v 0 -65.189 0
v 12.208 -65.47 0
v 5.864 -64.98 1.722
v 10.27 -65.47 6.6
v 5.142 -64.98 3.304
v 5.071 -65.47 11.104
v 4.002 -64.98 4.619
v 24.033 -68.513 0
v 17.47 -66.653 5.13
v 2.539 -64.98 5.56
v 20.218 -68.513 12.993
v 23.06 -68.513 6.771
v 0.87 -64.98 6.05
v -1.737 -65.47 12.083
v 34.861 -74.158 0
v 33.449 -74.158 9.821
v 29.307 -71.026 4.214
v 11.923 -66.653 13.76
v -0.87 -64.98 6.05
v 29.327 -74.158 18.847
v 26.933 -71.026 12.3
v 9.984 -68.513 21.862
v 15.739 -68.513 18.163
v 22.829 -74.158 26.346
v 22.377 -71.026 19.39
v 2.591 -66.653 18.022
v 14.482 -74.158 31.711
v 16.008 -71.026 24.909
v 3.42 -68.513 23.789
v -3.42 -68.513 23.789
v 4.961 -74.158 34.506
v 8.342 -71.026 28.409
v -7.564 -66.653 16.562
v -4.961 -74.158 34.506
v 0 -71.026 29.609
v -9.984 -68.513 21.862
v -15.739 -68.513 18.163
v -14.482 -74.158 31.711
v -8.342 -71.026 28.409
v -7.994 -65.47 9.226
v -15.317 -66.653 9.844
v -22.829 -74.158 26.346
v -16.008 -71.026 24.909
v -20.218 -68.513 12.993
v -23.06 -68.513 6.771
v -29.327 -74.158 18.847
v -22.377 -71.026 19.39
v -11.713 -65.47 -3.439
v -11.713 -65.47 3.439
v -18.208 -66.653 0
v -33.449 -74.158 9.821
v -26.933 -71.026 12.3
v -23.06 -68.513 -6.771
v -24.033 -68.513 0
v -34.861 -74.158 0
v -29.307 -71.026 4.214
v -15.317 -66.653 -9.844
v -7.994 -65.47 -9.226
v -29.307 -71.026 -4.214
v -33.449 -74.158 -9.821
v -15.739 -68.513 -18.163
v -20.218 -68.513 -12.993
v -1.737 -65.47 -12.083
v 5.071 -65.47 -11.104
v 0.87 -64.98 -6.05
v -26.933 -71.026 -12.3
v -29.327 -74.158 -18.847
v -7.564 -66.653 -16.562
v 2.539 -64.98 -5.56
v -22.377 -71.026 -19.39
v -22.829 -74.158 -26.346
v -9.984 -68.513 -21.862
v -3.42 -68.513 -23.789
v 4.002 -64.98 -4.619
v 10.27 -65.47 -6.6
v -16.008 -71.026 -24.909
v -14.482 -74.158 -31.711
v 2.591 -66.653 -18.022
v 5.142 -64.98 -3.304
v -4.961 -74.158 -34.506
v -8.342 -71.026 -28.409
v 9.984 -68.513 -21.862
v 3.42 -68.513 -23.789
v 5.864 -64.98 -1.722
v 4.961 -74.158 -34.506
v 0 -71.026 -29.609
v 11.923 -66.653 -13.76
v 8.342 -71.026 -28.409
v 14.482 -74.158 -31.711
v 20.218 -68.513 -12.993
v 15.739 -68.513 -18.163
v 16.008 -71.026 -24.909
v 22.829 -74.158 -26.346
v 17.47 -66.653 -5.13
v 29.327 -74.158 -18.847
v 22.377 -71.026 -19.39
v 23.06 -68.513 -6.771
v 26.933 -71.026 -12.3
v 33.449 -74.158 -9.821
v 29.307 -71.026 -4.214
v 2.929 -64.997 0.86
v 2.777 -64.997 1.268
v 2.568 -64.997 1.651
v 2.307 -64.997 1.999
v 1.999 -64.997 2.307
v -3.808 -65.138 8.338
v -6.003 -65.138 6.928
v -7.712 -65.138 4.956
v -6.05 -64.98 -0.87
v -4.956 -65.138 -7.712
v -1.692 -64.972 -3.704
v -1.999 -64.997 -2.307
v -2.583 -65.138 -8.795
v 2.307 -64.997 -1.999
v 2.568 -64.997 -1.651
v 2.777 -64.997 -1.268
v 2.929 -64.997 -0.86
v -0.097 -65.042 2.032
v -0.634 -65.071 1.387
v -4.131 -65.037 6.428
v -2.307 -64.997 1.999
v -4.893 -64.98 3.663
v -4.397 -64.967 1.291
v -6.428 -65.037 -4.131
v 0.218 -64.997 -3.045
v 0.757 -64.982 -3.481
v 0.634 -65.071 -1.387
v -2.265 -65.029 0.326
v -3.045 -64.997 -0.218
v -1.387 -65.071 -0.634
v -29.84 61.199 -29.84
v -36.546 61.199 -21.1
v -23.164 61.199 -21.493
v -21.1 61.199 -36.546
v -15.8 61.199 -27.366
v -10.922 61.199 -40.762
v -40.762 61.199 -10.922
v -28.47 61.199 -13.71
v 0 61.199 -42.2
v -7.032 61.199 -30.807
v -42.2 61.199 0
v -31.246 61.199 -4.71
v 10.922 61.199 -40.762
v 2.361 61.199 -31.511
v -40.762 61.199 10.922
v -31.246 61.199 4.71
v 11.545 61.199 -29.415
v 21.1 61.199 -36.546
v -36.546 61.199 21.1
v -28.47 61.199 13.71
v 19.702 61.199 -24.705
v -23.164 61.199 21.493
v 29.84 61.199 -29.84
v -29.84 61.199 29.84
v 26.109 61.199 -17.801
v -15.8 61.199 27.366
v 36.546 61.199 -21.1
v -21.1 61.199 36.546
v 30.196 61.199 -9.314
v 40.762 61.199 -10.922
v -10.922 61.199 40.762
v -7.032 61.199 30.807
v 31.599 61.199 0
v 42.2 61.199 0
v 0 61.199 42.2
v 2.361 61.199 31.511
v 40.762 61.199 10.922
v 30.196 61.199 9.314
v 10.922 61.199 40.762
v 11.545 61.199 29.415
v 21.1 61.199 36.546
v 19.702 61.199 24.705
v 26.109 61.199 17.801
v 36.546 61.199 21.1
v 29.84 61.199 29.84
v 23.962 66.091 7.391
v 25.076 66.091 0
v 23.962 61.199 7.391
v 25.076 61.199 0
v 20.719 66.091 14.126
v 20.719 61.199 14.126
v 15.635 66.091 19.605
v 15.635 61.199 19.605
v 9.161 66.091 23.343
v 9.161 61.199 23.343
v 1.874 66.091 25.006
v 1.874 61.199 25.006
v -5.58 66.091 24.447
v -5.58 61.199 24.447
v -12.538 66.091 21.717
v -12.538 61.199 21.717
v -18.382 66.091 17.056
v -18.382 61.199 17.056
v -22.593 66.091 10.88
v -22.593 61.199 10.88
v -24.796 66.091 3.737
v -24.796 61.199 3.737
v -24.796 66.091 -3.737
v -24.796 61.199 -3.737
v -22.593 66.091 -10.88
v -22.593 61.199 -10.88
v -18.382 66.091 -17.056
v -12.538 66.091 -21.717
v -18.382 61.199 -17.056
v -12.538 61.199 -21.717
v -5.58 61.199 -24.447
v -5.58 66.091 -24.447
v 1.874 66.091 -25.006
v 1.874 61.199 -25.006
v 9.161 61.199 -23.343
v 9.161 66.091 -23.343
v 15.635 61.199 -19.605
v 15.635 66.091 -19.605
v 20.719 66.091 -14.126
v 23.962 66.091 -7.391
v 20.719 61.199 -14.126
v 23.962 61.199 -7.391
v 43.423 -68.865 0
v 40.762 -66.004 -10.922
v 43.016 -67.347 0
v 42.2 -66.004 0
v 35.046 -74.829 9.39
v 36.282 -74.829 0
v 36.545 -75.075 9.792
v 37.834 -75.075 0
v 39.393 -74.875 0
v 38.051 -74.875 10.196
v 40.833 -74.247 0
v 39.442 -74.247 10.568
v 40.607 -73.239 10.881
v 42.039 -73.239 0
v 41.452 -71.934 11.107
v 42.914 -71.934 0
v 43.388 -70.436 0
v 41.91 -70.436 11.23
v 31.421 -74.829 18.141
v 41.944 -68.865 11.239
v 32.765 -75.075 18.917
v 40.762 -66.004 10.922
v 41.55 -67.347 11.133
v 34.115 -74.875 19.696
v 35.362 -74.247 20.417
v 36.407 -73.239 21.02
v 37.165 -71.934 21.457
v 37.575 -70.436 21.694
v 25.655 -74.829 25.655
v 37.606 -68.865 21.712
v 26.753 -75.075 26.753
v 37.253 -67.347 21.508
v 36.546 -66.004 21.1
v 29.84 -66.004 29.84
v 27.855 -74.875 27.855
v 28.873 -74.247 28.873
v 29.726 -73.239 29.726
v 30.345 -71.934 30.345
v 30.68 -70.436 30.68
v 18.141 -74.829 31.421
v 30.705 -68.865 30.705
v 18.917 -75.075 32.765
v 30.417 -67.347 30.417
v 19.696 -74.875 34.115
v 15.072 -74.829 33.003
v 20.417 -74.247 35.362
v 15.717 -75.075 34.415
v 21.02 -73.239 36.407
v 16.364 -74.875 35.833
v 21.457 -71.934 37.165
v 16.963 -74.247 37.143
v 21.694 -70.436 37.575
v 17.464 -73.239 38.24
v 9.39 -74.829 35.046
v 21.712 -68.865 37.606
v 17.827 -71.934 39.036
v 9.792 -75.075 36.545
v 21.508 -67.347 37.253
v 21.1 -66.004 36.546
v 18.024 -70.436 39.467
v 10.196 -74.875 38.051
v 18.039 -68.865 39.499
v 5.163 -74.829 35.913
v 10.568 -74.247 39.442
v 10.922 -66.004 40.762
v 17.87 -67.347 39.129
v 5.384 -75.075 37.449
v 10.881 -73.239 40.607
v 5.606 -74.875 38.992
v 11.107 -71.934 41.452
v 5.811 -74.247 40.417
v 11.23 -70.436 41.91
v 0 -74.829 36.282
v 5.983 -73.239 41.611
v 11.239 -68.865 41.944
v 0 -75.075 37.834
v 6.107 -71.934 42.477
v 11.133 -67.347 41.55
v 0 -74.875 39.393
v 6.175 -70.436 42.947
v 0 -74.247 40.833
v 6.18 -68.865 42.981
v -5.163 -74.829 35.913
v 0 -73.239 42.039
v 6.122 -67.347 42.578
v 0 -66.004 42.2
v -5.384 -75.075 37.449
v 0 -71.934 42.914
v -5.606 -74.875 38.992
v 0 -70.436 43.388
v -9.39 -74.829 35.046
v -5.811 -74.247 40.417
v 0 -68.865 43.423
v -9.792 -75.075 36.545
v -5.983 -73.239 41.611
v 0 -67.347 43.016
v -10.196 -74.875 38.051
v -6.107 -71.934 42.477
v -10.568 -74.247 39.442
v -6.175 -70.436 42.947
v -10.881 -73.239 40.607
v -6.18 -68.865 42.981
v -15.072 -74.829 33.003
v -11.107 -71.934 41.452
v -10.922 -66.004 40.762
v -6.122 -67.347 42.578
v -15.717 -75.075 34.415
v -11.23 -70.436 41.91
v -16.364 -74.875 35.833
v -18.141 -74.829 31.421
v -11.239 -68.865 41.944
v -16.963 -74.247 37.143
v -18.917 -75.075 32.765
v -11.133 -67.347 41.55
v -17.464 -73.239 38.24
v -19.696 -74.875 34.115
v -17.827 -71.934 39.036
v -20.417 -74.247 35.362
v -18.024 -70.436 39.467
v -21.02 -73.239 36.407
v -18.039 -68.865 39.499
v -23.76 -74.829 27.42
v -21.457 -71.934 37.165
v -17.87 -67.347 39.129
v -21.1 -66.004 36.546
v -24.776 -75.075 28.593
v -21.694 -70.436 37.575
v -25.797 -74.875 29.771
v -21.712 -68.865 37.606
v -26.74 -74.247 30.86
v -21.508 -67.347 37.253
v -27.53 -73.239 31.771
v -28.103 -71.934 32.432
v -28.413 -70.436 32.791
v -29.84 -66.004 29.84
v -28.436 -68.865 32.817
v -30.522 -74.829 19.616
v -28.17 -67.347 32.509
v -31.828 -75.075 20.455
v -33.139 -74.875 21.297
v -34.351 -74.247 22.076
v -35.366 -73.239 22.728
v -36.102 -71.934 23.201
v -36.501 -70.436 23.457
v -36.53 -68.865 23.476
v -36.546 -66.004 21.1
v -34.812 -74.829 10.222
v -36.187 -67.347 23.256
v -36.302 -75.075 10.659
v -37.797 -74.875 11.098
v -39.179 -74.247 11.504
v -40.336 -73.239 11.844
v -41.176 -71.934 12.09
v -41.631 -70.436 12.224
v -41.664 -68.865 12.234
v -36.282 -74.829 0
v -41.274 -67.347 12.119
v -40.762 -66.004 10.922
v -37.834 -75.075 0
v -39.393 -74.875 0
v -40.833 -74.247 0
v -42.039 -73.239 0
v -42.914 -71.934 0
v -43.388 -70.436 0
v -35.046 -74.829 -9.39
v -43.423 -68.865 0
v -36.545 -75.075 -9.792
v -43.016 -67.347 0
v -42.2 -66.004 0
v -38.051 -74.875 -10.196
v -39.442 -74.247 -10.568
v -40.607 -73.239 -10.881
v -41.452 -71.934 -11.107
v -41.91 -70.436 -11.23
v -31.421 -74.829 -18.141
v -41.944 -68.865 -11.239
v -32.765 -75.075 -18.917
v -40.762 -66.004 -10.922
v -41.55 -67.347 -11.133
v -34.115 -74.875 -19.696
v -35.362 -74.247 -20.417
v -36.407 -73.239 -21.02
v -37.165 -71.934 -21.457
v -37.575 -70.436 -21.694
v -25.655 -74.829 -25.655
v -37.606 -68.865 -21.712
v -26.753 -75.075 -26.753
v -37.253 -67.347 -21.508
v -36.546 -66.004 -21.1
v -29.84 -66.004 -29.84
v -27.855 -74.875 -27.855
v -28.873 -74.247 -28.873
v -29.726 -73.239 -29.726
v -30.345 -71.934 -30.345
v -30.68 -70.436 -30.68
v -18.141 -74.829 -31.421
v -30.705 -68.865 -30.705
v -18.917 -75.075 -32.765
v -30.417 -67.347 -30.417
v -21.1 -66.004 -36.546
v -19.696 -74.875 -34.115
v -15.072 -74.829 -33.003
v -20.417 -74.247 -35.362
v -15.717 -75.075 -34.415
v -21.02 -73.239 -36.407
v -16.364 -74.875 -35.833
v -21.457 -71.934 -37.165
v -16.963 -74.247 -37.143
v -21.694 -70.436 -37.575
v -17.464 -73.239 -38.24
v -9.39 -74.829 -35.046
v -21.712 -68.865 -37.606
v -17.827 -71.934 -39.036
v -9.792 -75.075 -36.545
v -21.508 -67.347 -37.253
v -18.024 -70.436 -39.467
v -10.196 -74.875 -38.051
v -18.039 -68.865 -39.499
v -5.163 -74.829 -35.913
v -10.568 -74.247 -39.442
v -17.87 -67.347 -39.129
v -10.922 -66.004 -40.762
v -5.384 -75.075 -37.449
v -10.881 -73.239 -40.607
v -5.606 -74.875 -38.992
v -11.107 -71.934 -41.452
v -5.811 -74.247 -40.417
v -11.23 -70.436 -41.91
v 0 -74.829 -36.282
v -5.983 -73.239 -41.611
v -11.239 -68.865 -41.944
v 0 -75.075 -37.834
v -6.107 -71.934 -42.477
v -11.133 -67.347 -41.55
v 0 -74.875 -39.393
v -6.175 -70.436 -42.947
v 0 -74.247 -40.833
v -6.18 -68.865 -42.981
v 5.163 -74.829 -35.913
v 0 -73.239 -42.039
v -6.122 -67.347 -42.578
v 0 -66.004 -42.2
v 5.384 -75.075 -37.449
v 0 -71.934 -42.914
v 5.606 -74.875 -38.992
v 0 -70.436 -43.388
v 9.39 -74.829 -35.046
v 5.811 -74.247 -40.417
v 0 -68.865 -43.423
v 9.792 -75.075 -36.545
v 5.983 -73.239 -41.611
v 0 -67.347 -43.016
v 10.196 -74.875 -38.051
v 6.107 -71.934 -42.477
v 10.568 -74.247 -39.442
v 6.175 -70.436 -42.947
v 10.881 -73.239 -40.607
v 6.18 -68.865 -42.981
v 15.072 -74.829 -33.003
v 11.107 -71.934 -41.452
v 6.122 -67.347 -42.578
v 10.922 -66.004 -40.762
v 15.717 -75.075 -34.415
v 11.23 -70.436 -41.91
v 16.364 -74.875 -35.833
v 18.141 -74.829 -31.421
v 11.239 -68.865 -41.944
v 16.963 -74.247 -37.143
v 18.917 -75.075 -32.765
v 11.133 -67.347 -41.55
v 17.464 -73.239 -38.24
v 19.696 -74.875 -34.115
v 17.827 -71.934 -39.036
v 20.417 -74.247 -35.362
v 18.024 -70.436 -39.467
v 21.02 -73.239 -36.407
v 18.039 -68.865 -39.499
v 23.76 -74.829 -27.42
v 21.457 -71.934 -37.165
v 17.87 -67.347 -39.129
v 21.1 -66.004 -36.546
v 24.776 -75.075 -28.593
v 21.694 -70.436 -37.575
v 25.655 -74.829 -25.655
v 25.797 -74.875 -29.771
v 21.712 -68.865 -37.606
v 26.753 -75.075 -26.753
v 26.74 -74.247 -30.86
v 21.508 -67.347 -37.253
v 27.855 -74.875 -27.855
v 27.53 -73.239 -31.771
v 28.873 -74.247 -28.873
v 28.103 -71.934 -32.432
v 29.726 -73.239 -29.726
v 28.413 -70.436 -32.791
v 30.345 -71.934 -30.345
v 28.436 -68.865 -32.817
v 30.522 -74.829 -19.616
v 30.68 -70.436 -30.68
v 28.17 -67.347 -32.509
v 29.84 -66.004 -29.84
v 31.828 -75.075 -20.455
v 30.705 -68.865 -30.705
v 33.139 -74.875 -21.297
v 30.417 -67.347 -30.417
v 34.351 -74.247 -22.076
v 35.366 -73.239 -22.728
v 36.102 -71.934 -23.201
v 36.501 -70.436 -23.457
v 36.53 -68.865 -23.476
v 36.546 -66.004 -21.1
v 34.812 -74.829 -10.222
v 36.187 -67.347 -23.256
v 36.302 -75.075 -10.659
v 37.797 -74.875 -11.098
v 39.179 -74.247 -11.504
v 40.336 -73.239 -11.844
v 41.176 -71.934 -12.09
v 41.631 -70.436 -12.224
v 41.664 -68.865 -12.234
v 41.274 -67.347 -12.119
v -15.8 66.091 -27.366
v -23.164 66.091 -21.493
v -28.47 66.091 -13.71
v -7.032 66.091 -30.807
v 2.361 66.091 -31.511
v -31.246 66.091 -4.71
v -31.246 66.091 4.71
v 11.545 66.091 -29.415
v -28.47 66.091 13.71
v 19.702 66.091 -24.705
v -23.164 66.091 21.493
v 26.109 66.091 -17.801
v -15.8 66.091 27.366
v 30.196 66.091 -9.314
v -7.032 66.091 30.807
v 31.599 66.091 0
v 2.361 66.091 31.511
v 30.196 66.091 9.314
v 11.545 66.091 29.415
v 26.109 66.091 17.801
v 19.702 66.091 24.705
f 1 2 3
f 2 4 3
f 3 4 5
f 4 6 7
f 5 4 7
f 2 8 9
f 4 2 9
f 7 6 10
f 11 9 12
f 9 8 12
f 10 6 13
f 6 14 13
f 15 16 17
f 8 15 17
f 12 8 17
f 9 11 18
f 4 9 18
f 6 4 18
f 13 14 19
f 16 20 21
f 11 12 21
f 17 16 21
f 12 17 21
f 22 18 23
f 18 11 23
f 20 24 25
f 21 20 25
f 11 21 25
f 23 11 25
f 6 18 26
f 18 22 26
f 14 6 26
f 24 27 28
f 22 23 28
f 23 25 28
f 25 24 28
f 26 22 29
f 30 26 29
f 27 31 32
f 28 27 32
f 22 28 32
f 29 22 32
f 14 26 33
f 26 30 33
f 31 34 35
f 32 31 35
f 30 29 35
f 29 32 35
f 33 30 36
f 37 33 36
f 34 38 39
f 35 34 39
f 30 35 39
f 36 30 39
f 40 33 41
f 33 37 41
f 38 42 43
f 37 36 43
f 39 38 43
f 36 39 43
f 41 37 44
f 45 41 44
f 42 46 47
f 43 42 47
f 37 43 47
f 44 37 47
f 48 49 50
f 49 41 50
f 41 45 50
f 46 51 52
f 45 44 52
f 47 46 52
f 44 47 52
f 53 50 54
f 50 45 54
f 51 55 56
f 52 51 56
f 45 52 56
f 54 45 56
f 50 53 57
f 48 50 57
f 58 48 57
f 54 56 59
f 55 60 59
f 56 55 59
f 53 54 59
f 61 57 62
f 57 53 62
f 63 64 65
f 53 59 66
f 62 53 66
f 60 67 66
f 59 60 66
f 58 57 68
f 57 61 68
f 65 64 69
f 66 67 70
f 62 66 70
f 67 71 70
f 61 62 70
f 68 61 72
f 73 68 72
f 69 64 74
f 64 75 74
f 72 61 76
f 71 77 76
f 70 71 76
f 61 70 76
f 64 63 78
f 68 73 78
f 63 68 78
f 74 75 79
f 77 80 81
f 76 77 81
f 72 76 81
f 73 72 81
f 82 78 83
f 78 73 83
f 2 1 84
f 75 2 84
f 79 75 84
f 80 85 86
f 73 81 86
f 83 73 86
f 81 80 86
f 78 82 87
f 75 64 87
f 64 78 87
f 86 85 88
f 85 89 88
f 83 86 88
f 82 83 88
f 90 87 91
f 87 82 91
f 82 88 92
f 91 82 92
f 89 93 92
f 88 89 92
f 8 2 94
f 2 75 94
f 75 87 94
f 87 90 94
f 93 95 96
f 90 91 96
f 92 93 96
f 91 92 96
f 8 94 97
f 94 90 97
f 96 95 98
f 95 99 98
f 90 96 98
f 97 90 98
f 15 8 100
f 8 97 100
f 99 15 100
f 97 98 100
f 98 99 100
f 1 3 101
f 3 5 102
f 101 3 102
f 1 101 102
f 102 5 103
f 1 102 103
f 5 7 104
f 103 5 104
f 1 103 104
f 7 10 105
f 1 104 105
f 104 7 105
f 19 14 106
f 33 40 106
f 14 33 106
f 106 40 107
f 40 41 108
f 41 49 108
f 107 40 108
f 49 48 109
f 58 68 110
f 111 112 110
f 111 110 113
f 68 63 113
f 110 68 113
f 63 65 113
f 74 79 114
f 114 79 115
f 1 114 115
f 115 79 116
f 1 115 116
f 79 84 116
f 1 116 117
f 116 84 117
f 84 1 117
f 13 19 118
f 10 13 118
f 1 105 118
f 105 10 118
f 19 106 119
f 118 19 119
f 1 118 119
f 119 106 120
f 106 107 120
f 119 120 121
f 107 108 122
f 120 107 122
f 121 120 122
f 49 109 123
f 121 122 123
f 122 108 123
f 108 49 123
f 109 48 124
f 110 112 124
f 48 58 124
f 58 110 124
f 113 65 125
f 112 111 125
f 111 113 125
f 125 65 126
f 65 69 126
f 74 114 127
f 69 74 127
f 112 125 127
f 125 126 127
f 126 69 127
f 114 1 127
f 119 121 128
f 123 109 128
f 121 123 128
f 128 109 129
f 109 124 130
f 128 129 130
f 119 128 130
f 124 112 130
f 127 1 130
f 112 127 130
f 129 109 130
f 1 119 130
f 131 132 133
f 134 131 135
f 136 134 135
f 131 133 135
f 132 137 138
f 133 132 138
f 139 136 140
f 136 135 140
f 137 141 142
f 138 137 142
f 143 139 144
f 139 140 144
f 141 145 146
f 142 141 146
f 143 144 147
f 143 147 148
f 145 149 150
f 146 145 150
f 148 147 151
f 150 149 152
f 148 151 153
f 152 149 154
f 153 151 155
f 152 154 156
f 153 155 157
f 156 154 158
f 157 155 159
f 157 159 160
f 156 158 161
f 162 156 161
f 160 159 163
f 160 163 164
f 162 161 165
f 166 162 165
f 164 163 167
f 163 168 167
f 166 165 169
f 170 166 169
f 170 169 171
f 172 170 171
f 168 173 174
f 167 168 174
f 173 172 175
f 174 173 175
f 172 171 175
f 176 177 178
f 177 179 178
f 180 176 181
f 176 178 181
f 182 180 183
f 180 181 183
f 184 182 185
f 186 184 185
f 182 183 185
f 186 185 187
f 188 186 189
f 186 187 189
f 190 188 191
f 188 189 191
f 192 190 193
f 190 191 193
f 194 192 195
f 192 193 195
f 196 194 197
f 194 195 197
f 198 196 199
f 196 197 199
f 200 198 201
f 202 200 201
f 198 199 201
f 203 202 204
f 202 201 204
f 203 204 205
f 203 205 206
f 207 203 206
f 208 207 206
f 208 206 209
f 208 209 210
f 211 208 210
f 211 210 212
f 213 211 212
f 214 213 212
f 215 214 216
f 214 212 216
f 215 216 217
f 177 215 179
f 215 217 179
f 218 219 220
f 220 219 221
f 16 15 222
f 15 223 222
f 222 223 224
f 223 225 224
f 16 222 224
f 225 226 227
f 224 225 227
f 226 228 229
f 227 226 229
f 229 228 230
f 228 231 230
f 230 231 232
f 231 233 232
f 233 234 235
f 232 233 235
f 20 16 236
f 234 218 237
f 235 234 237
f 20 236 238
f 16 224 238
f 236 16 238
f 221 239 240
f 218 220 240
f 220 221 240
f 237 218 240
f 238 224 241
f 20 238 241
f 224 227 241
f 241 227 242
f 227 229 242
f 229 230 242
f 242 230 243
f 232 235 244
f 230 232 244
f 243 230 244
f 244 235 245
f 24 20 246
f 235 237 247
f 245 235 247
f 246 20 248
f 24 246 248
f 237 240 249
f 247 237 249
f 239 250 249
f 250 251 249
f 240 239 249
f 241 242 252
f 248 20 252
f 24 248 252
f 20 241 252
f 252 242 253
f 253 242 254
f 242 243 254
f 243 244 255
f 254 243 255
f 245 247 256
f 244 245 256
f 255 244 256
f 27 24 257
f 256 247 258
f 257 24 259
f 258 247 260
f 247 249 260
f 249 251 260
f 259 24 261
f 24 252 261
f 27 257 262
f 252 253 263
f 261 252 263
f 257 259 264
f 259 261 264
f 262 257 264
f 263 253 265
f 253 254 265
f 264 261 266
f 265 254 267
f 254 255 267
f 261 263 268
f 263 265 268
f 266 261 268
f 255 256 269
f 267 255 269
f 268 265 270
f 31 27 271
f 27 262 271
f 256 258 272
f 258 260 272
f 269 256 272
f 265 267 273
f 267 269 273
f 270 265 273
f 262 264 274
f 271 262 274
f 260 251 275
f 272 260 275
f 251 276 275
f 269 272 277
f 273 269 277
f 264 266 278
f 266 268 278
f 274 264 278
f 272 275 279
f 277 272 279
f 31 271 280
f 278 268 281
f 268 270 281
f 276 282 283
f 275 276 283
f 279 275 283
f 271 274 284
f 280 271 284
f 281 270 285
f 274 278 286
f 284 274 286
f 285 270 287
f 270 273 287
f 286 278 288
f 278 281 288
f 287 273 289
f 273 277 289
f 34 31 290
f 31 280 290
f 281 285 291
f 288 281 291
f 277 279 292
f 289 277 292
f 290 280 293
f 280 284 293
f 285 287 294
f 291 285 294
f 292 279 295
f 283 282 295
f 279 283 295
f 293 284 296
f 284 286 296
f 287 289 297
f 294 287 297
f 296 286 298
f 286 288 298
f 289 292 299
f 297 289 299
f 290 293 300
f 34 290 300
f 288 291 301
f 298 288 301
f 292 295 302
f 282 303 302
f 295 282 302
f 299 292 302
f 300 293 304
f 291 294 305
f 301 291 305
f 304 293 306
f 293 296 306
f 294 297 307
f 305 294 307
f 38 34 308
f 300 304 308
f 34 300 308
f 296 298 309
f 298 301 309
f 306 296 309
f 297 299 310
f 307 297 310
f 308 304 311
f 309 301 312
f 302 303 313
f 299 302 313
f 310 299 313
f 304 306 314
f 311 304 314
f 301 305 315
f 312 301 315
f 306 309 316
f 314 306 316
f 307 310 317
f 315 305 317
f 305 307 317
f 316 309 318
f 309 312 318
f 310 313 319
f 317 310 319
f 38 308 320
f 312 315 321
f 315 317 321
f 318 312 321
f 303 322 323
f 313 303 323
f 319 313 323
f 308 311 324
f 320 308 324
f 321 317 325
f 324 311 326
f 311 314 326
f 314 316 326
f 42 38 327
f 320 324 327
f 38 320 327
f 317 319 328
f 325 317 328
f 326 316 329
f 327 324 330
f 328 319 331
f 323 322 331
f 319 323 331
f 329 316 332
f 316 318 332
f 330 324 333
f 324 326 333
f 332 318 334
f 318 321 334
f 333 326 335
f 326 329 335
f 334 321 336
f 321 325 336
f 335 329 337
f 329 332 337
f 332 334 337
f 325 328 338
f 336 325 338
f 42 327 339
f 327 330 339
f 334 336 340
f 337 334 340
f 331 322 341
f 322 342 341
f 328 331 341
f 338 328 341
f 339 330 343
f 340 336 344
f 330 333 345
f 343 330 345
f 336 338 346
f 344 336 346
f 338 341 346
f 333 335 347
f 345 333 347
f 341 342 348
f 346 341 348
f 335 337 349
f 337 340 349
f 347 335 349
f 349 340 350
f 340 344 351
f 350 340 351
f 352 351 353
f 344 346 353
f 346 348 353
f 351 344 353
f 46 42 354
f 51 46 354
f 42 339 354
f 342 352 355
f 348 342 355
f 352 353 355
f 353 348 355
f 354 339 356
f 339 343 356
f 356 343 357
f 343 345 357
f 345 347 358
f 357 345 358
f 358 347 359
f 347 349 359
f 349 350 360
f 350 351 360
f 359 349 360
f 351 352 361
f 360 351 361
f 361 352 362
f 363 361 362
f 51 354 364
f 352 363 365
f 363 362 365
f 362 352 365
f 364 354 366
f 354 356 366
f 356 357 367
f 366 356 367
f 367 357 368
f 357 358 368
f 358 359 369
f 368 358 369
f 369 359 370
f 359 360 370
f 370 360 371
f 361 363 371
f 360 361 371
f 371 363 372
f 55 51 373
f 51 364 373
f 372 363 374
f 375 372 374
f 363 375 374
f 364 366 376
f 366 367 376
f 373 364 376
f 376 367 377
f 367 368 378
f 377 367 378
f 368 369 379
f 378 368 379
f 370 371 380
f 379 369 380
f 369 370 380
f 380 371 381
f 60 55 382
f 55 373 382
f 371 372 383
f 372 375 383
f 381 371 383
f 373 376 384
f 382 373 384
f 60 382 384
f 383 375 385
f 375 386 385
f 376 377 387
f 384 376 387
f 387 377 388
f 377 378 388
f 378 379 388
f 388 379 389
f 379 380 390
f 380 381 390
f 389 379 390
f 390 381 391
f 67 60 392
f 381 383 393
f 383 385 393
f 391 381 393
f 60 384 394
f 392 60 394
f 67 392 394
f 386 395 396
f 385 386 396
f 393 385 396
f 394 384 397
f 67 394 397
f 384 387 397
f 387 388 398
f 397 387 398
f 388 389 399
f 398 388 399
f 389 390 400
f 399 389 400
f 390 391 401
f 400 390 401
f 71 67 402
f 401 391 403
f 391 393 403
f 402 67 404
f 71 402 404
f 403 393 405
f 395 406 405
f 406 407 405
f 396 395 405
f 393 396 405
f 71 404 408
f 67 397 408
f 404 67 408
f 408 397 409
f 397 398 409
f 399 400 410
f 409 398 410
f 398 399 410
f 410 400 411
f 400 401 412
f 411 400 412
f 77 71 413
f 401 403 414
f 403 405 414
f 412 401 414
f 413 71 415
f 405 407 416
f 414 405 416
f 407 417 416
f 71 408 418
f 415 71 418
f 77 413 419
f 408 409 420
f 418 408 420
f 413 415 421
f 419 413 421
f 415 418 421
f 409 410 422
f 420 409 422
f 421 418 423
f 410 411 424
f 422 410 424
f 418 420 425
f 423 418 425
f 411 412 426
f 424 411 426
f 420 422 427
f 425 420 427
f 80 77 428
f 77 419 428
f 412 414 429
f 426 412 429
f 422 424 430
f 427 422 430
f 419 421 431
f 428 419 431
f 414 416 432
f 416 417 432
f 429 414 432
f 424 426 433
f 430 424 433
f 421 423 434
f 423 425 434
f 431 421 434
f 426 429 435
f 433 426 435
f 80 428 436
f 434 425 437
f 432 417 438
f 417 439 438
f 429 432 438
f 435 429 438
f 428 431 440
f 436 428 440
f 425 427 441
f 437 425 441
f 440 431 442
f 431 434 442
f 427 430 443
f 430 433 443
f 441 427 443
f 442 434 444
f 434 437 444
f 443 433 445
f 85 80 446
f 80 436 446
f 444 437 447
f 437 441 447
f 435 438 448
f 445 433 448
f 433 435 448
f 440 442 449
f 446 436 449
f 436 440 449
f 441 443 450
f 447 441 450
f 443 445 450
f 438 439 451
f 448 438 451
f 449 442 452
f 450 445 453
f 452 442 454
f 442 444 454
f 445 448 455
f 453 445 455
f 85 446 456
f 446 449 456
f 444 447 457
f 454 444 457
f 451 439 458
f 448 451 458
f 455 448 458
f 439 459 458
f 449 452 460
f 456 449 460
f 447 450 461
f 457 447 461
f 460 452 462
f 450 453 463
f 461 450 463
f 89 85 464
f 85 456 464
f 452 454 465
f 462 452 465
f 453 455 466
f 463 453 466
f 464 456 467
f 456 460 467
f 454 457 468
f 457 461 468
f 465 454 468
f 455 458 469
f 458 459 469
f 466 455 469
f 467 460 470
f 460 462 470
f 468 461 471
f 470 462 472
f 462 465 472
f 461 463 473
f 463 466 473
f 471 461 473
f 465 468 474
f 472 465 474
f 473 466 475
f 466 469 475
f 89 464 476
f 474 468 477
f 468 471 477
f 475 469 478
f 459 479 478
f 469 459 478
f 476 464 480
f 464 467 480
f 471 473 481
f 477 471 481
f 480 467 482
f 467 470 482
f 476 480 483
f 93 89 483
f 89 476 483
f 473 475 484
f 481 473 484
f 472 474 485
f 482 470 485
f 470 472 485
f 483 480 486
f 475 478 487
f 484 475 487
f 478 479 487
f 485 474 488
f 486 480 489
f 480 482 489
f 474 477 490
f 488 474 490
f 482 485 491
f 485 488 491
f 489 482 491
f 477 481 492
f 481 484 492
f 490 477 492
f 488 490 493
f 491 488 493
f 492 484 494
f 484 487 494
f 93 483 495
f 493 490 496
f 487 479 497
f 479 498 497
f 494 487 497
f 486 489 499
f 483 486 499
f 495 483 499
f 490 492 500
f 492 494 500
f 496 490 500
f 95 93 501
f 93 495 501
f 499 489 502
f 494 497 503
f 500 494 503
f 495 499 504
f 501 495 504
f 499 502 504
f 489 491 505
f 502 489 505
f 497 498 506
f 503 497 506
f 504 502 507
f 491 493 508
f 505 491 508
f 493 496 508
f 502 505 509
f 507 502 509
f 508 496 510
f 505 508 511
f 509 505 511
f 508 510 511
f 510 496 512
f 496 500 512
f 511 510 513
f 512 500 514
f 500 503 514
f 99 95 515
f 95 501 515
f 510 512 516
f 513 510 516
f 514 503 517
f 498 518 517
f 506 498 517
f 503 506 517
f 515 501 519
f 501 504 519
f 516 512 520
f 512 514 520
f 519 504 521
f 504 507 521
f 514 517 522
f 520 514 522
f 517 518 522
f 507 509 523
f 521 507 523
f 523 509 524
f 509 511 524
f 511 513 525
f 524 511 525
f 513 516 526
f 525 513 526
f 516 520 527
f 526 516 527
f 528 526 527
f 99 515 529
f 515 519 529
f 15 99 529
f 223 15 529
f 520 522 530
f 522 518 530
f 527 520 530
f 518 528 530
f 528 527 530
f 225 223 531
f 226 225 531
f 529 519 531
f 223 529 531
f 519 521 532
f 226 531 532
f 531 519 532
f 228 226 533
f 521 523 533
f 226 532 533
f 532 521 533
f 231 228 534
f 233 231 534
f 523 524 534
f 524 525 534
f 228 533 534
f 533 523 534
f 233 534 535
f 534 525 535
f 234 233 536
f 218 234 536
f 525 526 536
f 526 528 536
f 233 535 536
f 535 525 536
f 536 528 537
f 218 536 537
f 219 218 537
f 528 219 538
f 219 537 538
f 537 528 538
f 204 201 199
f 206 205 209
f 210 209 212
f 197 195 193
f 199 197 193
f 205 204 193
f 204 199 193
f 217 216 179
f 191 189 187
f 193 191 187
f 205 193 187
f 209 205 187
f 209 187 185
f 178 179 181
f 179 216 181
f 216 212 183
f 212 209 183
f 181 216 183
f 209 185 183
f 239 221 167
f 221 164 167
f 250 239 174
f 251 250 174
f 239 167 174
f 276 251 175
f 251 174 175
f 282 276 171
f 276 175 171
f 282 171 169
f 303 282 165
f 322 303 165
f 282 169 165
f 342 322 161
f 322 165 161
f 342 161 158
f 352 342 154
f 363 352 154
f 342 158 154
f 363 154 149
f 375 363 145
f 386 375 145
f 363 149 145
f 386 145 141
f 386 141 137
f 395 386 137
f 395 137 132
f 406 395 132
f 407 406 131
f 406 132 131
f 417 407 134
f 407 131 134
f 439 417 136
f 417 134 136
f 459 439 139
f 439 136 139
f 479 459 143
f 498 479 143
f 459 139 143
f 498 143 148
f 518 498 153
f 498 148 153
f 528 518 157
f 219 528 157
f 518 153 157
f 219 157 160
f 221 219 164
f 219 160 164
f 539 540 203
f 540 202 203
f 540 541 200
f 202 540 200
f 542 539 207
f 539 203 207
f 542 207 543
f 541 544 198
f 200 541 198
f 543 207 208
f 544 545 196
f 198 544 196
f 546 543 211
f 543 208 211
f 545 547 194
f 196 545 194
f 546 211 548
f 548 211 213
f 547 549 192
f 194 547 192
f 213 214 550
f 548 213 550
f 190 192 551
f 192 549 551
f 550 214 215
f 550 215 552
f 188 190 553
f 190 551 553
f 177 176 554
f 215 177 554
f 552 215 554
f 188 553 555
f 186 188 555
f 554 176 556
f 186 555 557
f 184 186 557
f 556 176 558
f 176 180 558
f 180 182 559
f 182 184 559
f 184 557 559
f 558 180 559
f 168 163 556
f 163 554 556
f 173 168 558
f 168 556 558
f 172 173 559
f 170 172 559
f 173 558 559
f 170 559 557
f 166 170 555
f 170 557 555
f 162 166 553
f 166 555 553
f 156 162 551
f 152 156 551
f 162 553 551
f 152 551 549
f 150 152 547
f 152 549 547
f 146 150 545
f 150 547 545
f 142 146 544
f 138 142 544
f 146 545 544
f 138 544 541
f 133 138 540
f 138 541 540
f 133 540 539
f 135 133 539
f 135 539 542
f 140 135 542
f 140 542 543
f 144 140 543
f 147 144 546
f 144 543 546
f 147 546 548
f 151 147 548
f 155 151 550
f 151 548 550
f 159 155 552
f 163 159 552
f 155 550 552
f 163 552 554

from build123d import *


with BuildPart() as f1:
    # F0 (on Top) → F1 (revolve)
    with BuildSketch(Plane.XY):
        with BuildLine():
            ThreePointArc((0, -65.188989), (18.207665, -66.653242), (34.861051, -74.15843))
            ThreePointArc((34.861051, -74.15843), (42.039067, -73.239244), (42.199682, -66.004395))
            Line((42.199682, -66.004395), (42.199682, 61.1986))
            Line((42.199682, 61.1986), (31.599436, 61.1986))
            Line((31.599436, 61.1986), (31.599436, 66.091023))
            Line((31.599436, 66.091023), (25.076205, 66.091023))
            Line((25.076205, 66.091023), (25.076205, 61.1986))
            Line((25.076205, 61.1986), (0, 61.1986))
            Line((0, 61.1986), (0, -65.188989))
        make_face()
    revolve(axis=Axis((0, -3.626004, 0), (0, -1, 0)))


solid = f1.part
